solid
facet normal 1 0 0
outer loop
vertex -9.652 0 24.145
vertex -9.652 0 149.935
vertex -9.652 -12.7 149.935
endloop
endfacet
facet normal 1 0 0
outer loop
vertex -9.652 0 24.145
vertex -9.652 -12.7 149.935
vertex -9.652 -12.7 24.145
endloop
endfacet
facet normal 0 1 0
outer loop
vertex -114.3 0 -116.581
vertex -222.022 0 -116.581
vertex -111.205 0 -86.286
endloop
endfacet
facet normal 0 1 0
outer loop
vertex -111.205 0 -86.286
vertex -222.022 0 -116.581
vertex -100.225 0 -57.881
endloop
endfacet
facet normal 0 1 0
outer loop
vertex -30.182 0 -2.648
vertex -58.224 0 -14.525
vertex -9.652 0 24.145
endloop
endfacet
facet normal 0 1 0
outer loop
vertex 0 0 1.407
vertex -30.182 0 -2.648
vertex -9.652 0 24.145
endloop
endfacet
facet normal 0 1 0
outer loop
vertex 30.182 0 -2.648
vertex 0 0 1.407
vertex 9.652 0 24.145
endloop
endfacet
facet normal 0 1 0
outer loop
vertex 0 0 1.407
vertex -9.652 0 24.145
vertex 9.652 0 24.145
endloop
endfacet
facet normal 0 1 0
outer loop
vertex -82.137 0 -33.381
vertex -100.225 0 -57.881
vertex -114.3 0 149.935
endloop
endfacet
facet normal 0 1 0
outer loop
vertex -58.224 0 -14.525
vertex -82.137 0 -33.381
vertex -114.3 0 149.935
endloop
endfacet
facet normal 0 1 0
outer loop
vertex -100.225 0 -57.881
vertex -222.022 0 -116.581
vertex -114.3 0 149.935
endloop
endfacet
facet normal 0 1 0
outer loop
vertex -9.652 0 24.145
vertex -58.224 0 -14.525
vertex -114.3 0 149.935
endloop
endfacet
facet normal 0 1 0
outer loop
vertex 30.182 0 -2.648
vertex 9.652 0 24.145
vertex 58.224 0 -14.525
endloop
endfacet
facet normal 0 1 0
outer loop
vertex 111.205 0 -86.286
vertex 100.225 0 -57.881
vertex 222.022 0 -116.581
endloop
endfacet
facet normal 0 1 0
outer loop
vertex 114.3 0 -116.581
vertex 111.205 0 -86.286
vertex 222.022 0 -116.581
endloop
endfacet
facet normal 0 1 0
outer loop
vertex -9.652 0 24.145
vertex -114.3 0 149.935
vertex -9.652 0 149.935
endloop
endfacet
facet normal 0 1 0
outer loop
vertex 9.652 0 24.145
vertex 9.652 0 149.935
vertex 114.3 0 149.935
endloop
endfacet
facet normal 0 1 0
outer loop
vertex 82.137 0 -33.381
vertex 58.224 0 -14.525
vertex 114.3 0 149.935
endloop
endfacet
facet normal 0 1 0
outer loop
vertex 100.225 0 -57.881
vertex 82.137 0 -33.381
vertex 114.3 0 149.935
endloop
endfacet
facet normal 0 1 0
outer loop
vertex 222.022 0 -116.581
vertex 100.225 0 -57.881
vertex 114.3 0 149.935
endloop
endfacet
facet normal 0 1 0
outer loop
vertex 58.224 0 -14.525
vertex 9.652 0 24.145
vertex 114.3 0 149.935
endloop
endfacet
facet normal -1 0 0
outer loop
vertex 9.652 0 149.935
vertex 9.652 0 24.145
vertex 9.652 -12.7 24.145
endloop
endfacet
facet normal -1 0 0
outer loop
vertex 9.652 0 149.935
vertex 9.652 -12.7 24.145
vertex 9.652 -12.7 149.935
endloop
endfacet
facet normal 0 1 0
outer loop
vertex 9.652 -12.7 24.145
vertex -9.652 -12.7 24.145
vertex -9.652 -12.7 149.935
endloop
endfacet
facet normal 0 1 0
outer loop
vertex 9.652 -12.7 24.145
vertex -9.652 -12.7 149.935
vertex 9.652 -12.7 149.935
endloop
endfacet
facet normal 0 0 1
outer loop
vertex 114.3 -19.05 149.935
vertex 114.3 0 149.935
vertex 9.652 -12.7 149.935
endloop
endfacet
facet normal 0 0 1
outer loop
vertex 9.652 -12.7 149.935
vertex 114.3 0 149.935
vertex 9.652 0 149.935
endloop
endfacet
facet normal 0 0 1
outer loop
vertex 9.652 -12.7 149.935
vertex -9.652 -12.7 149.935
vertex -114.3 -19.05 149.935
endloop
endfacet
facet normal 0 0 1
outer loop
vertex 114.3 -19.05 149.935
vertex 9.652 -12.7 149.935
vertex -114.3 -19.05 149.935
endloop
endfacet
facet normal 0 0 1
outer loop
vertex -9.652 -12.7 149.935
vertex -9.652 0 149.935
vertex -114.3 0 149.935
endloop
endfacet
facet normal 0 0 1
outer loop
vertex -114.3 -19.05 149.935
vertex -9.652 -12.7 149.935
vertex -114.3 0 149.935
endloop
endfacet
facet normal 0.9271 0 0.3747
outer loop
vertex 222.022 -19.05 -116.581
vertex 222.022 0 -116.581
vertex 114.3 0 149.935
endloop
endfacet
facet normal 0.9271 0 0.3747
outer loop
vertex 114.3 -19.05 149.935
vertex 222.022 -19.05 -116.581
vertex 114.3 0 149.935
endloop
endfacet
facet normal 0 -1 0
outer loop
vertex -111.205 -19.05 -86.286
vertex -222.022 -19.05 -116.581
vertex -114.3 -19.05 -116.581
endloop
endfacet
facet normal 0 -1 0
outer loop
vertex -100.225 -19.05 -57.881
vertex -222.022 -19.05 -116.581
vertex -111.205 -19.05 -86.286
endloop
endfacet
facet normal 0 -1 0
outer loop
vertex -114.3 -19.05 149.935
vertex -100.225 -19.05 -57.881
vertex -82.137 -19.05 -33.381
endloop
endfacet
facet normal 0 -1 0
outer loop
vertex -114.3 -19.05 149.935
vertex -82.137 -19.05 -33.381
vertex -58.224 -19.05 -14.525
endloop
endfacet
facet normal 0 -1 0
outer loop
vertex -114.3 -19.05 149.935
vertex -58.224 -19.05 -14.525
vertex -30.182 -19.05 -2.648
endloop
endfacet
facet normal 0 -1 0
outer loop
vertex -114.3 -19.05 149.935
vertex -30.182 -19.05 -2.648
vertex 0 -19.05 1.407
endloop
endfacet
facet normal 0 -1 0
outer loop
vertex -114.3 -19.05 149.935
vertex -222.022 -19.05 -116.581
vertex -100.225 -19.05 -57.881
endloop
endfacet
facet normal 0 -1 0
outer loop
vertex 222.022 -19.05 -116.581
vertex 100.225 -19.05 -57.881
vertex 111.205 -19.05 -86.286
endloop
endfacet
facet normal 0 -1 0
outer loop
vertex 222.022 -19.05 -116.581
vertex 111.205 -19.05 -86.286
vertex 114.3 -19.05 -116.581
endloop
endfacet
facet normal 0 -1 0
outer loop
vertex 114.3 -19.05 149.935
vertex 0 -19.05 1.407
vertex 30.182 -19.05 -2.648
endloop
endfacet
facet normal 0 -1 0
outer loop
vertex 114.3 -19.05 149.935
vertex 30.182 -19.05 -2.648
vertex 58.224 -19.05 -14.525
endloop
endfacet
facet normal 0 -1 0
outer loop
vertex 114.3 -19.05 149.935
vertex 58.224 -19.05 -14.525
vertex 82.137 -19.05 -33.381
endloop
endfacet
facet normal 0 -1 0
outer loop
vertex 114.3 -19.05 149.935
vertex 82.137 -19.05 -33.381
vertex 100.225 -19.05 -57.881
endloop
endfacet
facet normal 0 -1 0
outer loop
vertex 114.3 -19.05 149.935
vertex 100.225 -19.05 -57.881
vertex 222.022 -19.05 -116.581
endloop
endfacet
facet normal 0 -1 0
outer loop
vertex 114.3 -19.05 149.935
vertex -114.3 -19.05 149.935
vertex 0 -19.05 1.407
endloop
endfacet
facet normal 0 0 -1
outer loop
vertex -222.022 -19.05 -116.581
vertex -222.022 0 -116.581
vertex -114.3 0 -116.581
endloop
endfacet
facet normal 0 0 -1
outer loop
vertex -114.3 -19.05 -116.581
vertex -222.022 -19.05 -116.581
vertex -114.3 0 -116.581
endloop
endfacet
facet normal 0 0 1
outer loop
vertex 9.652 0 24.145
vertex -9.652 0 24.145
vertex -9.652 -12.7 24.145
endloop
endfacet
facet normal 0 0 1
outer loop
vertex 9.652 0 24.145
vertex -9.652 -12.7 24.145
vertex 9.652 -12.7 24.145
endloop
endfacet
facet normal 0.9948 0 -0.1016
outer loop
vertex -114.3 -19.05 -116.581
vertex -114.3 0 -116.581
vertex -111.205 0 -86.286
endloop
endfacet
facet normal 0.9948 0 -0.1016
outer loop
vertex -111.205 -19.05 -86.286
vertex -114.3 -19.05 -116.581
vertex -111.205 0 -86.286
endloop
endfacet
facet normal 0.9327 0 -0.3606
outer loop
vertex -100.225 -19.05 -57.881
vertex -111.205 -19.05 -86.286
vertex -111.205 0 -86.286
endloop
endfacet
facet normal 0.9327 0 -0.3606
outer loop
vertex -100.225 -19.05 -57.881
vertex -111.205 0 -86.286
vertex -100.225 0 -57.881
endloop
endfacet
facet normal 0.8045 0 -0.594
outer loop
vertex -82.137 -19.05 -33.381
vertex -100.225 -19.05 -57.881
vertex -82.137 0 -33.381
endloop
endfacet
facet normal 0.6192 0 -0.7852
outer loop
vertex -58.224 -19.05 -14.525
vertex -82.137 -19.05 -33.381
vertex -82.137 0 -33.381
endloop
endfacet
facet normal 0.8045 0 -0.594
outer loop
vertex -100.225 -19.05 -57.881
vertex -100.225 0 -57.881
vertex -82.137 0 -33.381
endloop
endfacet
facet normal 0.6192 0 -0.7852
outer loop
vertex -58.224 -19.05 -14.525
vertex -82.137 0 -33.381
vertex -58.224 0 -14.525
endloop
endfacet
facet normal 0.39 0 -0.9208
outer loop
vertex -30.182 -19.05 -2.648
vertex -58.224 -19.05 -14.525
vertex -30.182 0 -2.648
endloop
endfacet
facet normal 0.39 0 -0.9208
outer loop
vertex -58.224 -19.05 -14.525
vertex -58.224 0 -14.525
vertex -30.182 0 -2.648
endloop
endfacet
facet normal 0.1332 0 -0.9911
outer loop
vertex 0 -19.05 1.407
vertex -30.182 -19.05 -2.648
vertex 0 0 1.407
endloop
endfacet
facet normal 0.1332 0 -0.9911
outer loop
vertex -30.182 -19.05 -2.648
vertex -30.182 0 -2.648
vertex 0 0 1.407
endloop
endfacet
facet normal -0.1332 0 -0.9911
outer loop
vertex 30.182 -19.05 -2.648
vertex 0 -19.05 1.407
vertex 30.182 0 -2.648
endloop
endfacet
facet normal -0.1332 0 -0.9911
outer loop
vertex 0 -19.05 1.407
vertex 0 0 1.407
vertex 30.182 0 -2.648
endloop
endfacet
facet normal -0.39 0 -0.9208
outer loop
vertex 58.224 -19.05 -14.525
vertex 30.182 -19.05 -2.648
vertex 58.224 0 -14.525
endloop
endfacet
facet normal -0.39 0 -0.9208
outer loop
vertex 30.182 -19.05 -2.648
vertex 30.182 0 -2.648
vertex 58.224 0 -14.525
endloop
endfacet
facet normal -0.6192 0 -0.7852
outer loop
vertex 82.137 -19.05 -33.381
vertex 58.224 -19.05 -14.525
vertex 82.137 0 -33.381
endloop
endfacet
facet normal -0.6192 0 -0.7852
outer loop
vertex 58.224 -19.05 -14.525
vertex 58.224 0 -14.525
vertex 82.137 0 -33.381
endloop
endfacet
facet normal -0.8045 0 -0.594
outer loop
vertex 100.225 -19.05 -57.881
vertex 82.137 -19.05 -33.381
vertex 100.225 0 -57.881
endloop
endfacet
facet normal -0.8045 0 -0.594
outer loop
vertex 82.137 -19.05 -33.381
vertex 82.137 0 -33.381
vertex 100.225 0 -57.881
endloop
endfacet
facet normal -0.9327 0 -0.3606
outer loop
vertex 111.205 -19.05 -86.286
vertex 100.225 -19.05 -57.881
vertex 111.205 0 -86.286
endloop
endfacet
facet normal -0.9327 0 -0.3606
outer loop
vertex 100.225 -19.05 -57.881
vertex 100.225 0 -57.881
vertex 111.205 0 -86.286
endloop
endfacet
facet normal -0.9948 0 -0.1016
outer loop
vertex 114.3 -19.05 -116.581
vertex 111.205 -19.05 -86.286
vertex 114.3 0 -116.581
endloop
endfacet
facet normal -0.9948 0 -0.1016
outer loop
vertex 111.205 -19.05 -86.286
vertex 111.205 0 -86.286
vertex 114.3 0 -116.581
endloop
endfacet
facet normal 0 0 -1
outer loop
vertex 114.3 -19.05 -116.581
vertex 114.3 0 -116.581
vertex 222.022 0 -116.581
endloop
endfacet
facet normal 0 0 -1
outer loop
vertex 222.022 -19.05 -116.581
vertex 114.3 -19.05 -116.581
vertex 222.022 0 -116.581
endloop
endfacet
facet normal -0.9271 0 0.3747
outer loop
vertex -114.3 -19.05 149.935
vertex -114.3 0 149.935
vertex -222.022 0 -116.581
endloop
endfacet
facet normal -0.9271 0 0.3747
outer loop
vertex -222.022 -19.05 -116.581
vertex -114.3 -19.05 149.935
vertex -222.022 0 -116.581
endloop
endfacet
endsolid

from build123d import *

# Parameters (mm, degrees)
F1_DEPTH = 19.05
F3_DEPTH = 12.7


with BuildPart() as f1:
    # F0 (on Front) → F1 (new body)
    with BuildSketch(Plane.XZ):
        with BuildLine():
            Line((114.3, 149.934994), (0, 149.934994))
            Line((0, 149.934994), (-114.3, 149.934994))
            Line((-114.3, 149.934994), (-222.022257, -116.581239))
            Line((-222.022257, -116.581239), (-114.3, -116.581239))
            ThreePointArc((-114.3, -116.581239), (0, 1.407281), (114.3, -116.581239))
            Line((114.3, -116.581239), (222.022257, -116.581239))
            Line((222.022257, -116.581239), (114.3, 149.934994))
        make_face()
    extrude(amount=F1_DEPTH)

    # F2 (on Front) → F3 (cut)
    with BuildSketch(Plane.XZ):
        Polygon((-9.652, 24.14524), (0, 24.14524), (9.652, 24.14524), (9.652, 151.098922), (0, 151.098922), (-9.652, 151.098922), align=None)
    extrude(amount=F3_DEPTH, mode=Mode.SUBTRACT)


solid = f1.part
